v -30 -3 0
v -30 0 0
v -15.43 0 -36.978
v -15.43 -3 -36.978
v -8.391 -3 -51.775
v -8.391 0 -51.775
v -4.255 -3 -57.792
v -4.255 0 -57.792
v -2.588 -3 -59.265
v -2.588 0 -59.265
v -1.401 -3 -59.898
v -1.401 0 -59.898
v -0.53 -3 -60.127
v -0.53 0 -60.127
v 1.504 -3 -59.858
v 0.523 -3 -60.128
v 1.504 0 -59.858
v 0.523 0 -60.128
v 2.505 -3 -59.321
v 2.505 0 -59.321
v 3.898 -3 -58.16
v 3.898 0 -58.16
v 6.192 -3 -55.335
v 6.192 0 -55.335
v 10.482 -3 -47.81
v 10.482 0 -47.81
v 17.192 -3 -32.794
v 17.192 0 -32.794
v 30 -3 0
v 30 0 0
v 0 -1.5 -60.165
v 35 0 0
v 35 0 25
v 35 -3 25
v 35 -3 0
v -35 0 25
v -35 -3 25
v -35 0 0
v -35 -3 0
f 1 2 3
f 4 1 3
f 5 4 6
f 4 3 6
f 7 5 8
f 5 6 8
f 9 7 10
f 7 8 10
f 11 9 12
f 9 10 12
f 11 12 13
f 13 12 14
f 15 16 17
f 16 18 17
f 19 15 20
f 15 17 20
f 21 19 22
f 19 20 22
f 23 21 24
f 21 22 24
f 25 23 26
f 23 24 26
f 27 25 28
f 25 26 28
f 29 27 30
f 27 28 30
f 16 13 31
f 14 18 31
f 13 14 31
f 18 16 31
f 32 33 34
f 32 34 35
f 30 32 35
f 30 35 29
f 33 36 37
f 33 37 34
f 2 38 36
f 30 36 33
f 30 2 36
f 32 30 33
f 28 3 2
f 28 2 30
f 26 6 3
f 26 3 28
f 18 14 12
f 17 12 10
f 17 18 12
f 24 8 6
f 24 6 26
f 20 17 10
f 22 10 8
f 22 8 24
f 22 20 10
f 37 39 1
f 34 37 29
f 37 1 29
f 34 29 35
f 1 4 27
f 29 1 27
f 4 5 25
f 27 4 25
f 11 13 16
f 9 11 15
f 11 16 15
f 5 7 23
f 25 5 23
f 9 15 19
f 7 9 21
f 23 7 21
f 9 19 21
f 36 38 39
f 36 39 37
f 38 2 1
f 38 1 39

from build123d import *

# Parameters (mm, degrees)
BASE_FLANGE1_DEPTH = 3


# Sheet-metal steps are written as plain solids
with BuildPart() as part:
    # Sketch1 → Base-Flange1 (new body)
    with BuildSketch(Plane(origin=(0, 0, 0), x_dir=(1, 0, 0), z_dir=(0, 1, 0))):
        with BuildLine():
            Line((-30, 0), (-35, 0))
            Line((-35, 0), (-35, -25))
            Line((-35, -25), (35, -25))
            Line((35, -25), (35, 0))
            Line((35, 0), (30, 0))
            add(Edge.make_bspline(
                [(-30, 0), (0, 79.677475969), (30, 0)],
                knots=[0, 0, 0, 1, 1, 1], degree=2, weights=[1, 3.083399466, 1]))
        make_face()
    extrude(amount=-BASE_FLANGE1_DEPTH)


solid = part.part
